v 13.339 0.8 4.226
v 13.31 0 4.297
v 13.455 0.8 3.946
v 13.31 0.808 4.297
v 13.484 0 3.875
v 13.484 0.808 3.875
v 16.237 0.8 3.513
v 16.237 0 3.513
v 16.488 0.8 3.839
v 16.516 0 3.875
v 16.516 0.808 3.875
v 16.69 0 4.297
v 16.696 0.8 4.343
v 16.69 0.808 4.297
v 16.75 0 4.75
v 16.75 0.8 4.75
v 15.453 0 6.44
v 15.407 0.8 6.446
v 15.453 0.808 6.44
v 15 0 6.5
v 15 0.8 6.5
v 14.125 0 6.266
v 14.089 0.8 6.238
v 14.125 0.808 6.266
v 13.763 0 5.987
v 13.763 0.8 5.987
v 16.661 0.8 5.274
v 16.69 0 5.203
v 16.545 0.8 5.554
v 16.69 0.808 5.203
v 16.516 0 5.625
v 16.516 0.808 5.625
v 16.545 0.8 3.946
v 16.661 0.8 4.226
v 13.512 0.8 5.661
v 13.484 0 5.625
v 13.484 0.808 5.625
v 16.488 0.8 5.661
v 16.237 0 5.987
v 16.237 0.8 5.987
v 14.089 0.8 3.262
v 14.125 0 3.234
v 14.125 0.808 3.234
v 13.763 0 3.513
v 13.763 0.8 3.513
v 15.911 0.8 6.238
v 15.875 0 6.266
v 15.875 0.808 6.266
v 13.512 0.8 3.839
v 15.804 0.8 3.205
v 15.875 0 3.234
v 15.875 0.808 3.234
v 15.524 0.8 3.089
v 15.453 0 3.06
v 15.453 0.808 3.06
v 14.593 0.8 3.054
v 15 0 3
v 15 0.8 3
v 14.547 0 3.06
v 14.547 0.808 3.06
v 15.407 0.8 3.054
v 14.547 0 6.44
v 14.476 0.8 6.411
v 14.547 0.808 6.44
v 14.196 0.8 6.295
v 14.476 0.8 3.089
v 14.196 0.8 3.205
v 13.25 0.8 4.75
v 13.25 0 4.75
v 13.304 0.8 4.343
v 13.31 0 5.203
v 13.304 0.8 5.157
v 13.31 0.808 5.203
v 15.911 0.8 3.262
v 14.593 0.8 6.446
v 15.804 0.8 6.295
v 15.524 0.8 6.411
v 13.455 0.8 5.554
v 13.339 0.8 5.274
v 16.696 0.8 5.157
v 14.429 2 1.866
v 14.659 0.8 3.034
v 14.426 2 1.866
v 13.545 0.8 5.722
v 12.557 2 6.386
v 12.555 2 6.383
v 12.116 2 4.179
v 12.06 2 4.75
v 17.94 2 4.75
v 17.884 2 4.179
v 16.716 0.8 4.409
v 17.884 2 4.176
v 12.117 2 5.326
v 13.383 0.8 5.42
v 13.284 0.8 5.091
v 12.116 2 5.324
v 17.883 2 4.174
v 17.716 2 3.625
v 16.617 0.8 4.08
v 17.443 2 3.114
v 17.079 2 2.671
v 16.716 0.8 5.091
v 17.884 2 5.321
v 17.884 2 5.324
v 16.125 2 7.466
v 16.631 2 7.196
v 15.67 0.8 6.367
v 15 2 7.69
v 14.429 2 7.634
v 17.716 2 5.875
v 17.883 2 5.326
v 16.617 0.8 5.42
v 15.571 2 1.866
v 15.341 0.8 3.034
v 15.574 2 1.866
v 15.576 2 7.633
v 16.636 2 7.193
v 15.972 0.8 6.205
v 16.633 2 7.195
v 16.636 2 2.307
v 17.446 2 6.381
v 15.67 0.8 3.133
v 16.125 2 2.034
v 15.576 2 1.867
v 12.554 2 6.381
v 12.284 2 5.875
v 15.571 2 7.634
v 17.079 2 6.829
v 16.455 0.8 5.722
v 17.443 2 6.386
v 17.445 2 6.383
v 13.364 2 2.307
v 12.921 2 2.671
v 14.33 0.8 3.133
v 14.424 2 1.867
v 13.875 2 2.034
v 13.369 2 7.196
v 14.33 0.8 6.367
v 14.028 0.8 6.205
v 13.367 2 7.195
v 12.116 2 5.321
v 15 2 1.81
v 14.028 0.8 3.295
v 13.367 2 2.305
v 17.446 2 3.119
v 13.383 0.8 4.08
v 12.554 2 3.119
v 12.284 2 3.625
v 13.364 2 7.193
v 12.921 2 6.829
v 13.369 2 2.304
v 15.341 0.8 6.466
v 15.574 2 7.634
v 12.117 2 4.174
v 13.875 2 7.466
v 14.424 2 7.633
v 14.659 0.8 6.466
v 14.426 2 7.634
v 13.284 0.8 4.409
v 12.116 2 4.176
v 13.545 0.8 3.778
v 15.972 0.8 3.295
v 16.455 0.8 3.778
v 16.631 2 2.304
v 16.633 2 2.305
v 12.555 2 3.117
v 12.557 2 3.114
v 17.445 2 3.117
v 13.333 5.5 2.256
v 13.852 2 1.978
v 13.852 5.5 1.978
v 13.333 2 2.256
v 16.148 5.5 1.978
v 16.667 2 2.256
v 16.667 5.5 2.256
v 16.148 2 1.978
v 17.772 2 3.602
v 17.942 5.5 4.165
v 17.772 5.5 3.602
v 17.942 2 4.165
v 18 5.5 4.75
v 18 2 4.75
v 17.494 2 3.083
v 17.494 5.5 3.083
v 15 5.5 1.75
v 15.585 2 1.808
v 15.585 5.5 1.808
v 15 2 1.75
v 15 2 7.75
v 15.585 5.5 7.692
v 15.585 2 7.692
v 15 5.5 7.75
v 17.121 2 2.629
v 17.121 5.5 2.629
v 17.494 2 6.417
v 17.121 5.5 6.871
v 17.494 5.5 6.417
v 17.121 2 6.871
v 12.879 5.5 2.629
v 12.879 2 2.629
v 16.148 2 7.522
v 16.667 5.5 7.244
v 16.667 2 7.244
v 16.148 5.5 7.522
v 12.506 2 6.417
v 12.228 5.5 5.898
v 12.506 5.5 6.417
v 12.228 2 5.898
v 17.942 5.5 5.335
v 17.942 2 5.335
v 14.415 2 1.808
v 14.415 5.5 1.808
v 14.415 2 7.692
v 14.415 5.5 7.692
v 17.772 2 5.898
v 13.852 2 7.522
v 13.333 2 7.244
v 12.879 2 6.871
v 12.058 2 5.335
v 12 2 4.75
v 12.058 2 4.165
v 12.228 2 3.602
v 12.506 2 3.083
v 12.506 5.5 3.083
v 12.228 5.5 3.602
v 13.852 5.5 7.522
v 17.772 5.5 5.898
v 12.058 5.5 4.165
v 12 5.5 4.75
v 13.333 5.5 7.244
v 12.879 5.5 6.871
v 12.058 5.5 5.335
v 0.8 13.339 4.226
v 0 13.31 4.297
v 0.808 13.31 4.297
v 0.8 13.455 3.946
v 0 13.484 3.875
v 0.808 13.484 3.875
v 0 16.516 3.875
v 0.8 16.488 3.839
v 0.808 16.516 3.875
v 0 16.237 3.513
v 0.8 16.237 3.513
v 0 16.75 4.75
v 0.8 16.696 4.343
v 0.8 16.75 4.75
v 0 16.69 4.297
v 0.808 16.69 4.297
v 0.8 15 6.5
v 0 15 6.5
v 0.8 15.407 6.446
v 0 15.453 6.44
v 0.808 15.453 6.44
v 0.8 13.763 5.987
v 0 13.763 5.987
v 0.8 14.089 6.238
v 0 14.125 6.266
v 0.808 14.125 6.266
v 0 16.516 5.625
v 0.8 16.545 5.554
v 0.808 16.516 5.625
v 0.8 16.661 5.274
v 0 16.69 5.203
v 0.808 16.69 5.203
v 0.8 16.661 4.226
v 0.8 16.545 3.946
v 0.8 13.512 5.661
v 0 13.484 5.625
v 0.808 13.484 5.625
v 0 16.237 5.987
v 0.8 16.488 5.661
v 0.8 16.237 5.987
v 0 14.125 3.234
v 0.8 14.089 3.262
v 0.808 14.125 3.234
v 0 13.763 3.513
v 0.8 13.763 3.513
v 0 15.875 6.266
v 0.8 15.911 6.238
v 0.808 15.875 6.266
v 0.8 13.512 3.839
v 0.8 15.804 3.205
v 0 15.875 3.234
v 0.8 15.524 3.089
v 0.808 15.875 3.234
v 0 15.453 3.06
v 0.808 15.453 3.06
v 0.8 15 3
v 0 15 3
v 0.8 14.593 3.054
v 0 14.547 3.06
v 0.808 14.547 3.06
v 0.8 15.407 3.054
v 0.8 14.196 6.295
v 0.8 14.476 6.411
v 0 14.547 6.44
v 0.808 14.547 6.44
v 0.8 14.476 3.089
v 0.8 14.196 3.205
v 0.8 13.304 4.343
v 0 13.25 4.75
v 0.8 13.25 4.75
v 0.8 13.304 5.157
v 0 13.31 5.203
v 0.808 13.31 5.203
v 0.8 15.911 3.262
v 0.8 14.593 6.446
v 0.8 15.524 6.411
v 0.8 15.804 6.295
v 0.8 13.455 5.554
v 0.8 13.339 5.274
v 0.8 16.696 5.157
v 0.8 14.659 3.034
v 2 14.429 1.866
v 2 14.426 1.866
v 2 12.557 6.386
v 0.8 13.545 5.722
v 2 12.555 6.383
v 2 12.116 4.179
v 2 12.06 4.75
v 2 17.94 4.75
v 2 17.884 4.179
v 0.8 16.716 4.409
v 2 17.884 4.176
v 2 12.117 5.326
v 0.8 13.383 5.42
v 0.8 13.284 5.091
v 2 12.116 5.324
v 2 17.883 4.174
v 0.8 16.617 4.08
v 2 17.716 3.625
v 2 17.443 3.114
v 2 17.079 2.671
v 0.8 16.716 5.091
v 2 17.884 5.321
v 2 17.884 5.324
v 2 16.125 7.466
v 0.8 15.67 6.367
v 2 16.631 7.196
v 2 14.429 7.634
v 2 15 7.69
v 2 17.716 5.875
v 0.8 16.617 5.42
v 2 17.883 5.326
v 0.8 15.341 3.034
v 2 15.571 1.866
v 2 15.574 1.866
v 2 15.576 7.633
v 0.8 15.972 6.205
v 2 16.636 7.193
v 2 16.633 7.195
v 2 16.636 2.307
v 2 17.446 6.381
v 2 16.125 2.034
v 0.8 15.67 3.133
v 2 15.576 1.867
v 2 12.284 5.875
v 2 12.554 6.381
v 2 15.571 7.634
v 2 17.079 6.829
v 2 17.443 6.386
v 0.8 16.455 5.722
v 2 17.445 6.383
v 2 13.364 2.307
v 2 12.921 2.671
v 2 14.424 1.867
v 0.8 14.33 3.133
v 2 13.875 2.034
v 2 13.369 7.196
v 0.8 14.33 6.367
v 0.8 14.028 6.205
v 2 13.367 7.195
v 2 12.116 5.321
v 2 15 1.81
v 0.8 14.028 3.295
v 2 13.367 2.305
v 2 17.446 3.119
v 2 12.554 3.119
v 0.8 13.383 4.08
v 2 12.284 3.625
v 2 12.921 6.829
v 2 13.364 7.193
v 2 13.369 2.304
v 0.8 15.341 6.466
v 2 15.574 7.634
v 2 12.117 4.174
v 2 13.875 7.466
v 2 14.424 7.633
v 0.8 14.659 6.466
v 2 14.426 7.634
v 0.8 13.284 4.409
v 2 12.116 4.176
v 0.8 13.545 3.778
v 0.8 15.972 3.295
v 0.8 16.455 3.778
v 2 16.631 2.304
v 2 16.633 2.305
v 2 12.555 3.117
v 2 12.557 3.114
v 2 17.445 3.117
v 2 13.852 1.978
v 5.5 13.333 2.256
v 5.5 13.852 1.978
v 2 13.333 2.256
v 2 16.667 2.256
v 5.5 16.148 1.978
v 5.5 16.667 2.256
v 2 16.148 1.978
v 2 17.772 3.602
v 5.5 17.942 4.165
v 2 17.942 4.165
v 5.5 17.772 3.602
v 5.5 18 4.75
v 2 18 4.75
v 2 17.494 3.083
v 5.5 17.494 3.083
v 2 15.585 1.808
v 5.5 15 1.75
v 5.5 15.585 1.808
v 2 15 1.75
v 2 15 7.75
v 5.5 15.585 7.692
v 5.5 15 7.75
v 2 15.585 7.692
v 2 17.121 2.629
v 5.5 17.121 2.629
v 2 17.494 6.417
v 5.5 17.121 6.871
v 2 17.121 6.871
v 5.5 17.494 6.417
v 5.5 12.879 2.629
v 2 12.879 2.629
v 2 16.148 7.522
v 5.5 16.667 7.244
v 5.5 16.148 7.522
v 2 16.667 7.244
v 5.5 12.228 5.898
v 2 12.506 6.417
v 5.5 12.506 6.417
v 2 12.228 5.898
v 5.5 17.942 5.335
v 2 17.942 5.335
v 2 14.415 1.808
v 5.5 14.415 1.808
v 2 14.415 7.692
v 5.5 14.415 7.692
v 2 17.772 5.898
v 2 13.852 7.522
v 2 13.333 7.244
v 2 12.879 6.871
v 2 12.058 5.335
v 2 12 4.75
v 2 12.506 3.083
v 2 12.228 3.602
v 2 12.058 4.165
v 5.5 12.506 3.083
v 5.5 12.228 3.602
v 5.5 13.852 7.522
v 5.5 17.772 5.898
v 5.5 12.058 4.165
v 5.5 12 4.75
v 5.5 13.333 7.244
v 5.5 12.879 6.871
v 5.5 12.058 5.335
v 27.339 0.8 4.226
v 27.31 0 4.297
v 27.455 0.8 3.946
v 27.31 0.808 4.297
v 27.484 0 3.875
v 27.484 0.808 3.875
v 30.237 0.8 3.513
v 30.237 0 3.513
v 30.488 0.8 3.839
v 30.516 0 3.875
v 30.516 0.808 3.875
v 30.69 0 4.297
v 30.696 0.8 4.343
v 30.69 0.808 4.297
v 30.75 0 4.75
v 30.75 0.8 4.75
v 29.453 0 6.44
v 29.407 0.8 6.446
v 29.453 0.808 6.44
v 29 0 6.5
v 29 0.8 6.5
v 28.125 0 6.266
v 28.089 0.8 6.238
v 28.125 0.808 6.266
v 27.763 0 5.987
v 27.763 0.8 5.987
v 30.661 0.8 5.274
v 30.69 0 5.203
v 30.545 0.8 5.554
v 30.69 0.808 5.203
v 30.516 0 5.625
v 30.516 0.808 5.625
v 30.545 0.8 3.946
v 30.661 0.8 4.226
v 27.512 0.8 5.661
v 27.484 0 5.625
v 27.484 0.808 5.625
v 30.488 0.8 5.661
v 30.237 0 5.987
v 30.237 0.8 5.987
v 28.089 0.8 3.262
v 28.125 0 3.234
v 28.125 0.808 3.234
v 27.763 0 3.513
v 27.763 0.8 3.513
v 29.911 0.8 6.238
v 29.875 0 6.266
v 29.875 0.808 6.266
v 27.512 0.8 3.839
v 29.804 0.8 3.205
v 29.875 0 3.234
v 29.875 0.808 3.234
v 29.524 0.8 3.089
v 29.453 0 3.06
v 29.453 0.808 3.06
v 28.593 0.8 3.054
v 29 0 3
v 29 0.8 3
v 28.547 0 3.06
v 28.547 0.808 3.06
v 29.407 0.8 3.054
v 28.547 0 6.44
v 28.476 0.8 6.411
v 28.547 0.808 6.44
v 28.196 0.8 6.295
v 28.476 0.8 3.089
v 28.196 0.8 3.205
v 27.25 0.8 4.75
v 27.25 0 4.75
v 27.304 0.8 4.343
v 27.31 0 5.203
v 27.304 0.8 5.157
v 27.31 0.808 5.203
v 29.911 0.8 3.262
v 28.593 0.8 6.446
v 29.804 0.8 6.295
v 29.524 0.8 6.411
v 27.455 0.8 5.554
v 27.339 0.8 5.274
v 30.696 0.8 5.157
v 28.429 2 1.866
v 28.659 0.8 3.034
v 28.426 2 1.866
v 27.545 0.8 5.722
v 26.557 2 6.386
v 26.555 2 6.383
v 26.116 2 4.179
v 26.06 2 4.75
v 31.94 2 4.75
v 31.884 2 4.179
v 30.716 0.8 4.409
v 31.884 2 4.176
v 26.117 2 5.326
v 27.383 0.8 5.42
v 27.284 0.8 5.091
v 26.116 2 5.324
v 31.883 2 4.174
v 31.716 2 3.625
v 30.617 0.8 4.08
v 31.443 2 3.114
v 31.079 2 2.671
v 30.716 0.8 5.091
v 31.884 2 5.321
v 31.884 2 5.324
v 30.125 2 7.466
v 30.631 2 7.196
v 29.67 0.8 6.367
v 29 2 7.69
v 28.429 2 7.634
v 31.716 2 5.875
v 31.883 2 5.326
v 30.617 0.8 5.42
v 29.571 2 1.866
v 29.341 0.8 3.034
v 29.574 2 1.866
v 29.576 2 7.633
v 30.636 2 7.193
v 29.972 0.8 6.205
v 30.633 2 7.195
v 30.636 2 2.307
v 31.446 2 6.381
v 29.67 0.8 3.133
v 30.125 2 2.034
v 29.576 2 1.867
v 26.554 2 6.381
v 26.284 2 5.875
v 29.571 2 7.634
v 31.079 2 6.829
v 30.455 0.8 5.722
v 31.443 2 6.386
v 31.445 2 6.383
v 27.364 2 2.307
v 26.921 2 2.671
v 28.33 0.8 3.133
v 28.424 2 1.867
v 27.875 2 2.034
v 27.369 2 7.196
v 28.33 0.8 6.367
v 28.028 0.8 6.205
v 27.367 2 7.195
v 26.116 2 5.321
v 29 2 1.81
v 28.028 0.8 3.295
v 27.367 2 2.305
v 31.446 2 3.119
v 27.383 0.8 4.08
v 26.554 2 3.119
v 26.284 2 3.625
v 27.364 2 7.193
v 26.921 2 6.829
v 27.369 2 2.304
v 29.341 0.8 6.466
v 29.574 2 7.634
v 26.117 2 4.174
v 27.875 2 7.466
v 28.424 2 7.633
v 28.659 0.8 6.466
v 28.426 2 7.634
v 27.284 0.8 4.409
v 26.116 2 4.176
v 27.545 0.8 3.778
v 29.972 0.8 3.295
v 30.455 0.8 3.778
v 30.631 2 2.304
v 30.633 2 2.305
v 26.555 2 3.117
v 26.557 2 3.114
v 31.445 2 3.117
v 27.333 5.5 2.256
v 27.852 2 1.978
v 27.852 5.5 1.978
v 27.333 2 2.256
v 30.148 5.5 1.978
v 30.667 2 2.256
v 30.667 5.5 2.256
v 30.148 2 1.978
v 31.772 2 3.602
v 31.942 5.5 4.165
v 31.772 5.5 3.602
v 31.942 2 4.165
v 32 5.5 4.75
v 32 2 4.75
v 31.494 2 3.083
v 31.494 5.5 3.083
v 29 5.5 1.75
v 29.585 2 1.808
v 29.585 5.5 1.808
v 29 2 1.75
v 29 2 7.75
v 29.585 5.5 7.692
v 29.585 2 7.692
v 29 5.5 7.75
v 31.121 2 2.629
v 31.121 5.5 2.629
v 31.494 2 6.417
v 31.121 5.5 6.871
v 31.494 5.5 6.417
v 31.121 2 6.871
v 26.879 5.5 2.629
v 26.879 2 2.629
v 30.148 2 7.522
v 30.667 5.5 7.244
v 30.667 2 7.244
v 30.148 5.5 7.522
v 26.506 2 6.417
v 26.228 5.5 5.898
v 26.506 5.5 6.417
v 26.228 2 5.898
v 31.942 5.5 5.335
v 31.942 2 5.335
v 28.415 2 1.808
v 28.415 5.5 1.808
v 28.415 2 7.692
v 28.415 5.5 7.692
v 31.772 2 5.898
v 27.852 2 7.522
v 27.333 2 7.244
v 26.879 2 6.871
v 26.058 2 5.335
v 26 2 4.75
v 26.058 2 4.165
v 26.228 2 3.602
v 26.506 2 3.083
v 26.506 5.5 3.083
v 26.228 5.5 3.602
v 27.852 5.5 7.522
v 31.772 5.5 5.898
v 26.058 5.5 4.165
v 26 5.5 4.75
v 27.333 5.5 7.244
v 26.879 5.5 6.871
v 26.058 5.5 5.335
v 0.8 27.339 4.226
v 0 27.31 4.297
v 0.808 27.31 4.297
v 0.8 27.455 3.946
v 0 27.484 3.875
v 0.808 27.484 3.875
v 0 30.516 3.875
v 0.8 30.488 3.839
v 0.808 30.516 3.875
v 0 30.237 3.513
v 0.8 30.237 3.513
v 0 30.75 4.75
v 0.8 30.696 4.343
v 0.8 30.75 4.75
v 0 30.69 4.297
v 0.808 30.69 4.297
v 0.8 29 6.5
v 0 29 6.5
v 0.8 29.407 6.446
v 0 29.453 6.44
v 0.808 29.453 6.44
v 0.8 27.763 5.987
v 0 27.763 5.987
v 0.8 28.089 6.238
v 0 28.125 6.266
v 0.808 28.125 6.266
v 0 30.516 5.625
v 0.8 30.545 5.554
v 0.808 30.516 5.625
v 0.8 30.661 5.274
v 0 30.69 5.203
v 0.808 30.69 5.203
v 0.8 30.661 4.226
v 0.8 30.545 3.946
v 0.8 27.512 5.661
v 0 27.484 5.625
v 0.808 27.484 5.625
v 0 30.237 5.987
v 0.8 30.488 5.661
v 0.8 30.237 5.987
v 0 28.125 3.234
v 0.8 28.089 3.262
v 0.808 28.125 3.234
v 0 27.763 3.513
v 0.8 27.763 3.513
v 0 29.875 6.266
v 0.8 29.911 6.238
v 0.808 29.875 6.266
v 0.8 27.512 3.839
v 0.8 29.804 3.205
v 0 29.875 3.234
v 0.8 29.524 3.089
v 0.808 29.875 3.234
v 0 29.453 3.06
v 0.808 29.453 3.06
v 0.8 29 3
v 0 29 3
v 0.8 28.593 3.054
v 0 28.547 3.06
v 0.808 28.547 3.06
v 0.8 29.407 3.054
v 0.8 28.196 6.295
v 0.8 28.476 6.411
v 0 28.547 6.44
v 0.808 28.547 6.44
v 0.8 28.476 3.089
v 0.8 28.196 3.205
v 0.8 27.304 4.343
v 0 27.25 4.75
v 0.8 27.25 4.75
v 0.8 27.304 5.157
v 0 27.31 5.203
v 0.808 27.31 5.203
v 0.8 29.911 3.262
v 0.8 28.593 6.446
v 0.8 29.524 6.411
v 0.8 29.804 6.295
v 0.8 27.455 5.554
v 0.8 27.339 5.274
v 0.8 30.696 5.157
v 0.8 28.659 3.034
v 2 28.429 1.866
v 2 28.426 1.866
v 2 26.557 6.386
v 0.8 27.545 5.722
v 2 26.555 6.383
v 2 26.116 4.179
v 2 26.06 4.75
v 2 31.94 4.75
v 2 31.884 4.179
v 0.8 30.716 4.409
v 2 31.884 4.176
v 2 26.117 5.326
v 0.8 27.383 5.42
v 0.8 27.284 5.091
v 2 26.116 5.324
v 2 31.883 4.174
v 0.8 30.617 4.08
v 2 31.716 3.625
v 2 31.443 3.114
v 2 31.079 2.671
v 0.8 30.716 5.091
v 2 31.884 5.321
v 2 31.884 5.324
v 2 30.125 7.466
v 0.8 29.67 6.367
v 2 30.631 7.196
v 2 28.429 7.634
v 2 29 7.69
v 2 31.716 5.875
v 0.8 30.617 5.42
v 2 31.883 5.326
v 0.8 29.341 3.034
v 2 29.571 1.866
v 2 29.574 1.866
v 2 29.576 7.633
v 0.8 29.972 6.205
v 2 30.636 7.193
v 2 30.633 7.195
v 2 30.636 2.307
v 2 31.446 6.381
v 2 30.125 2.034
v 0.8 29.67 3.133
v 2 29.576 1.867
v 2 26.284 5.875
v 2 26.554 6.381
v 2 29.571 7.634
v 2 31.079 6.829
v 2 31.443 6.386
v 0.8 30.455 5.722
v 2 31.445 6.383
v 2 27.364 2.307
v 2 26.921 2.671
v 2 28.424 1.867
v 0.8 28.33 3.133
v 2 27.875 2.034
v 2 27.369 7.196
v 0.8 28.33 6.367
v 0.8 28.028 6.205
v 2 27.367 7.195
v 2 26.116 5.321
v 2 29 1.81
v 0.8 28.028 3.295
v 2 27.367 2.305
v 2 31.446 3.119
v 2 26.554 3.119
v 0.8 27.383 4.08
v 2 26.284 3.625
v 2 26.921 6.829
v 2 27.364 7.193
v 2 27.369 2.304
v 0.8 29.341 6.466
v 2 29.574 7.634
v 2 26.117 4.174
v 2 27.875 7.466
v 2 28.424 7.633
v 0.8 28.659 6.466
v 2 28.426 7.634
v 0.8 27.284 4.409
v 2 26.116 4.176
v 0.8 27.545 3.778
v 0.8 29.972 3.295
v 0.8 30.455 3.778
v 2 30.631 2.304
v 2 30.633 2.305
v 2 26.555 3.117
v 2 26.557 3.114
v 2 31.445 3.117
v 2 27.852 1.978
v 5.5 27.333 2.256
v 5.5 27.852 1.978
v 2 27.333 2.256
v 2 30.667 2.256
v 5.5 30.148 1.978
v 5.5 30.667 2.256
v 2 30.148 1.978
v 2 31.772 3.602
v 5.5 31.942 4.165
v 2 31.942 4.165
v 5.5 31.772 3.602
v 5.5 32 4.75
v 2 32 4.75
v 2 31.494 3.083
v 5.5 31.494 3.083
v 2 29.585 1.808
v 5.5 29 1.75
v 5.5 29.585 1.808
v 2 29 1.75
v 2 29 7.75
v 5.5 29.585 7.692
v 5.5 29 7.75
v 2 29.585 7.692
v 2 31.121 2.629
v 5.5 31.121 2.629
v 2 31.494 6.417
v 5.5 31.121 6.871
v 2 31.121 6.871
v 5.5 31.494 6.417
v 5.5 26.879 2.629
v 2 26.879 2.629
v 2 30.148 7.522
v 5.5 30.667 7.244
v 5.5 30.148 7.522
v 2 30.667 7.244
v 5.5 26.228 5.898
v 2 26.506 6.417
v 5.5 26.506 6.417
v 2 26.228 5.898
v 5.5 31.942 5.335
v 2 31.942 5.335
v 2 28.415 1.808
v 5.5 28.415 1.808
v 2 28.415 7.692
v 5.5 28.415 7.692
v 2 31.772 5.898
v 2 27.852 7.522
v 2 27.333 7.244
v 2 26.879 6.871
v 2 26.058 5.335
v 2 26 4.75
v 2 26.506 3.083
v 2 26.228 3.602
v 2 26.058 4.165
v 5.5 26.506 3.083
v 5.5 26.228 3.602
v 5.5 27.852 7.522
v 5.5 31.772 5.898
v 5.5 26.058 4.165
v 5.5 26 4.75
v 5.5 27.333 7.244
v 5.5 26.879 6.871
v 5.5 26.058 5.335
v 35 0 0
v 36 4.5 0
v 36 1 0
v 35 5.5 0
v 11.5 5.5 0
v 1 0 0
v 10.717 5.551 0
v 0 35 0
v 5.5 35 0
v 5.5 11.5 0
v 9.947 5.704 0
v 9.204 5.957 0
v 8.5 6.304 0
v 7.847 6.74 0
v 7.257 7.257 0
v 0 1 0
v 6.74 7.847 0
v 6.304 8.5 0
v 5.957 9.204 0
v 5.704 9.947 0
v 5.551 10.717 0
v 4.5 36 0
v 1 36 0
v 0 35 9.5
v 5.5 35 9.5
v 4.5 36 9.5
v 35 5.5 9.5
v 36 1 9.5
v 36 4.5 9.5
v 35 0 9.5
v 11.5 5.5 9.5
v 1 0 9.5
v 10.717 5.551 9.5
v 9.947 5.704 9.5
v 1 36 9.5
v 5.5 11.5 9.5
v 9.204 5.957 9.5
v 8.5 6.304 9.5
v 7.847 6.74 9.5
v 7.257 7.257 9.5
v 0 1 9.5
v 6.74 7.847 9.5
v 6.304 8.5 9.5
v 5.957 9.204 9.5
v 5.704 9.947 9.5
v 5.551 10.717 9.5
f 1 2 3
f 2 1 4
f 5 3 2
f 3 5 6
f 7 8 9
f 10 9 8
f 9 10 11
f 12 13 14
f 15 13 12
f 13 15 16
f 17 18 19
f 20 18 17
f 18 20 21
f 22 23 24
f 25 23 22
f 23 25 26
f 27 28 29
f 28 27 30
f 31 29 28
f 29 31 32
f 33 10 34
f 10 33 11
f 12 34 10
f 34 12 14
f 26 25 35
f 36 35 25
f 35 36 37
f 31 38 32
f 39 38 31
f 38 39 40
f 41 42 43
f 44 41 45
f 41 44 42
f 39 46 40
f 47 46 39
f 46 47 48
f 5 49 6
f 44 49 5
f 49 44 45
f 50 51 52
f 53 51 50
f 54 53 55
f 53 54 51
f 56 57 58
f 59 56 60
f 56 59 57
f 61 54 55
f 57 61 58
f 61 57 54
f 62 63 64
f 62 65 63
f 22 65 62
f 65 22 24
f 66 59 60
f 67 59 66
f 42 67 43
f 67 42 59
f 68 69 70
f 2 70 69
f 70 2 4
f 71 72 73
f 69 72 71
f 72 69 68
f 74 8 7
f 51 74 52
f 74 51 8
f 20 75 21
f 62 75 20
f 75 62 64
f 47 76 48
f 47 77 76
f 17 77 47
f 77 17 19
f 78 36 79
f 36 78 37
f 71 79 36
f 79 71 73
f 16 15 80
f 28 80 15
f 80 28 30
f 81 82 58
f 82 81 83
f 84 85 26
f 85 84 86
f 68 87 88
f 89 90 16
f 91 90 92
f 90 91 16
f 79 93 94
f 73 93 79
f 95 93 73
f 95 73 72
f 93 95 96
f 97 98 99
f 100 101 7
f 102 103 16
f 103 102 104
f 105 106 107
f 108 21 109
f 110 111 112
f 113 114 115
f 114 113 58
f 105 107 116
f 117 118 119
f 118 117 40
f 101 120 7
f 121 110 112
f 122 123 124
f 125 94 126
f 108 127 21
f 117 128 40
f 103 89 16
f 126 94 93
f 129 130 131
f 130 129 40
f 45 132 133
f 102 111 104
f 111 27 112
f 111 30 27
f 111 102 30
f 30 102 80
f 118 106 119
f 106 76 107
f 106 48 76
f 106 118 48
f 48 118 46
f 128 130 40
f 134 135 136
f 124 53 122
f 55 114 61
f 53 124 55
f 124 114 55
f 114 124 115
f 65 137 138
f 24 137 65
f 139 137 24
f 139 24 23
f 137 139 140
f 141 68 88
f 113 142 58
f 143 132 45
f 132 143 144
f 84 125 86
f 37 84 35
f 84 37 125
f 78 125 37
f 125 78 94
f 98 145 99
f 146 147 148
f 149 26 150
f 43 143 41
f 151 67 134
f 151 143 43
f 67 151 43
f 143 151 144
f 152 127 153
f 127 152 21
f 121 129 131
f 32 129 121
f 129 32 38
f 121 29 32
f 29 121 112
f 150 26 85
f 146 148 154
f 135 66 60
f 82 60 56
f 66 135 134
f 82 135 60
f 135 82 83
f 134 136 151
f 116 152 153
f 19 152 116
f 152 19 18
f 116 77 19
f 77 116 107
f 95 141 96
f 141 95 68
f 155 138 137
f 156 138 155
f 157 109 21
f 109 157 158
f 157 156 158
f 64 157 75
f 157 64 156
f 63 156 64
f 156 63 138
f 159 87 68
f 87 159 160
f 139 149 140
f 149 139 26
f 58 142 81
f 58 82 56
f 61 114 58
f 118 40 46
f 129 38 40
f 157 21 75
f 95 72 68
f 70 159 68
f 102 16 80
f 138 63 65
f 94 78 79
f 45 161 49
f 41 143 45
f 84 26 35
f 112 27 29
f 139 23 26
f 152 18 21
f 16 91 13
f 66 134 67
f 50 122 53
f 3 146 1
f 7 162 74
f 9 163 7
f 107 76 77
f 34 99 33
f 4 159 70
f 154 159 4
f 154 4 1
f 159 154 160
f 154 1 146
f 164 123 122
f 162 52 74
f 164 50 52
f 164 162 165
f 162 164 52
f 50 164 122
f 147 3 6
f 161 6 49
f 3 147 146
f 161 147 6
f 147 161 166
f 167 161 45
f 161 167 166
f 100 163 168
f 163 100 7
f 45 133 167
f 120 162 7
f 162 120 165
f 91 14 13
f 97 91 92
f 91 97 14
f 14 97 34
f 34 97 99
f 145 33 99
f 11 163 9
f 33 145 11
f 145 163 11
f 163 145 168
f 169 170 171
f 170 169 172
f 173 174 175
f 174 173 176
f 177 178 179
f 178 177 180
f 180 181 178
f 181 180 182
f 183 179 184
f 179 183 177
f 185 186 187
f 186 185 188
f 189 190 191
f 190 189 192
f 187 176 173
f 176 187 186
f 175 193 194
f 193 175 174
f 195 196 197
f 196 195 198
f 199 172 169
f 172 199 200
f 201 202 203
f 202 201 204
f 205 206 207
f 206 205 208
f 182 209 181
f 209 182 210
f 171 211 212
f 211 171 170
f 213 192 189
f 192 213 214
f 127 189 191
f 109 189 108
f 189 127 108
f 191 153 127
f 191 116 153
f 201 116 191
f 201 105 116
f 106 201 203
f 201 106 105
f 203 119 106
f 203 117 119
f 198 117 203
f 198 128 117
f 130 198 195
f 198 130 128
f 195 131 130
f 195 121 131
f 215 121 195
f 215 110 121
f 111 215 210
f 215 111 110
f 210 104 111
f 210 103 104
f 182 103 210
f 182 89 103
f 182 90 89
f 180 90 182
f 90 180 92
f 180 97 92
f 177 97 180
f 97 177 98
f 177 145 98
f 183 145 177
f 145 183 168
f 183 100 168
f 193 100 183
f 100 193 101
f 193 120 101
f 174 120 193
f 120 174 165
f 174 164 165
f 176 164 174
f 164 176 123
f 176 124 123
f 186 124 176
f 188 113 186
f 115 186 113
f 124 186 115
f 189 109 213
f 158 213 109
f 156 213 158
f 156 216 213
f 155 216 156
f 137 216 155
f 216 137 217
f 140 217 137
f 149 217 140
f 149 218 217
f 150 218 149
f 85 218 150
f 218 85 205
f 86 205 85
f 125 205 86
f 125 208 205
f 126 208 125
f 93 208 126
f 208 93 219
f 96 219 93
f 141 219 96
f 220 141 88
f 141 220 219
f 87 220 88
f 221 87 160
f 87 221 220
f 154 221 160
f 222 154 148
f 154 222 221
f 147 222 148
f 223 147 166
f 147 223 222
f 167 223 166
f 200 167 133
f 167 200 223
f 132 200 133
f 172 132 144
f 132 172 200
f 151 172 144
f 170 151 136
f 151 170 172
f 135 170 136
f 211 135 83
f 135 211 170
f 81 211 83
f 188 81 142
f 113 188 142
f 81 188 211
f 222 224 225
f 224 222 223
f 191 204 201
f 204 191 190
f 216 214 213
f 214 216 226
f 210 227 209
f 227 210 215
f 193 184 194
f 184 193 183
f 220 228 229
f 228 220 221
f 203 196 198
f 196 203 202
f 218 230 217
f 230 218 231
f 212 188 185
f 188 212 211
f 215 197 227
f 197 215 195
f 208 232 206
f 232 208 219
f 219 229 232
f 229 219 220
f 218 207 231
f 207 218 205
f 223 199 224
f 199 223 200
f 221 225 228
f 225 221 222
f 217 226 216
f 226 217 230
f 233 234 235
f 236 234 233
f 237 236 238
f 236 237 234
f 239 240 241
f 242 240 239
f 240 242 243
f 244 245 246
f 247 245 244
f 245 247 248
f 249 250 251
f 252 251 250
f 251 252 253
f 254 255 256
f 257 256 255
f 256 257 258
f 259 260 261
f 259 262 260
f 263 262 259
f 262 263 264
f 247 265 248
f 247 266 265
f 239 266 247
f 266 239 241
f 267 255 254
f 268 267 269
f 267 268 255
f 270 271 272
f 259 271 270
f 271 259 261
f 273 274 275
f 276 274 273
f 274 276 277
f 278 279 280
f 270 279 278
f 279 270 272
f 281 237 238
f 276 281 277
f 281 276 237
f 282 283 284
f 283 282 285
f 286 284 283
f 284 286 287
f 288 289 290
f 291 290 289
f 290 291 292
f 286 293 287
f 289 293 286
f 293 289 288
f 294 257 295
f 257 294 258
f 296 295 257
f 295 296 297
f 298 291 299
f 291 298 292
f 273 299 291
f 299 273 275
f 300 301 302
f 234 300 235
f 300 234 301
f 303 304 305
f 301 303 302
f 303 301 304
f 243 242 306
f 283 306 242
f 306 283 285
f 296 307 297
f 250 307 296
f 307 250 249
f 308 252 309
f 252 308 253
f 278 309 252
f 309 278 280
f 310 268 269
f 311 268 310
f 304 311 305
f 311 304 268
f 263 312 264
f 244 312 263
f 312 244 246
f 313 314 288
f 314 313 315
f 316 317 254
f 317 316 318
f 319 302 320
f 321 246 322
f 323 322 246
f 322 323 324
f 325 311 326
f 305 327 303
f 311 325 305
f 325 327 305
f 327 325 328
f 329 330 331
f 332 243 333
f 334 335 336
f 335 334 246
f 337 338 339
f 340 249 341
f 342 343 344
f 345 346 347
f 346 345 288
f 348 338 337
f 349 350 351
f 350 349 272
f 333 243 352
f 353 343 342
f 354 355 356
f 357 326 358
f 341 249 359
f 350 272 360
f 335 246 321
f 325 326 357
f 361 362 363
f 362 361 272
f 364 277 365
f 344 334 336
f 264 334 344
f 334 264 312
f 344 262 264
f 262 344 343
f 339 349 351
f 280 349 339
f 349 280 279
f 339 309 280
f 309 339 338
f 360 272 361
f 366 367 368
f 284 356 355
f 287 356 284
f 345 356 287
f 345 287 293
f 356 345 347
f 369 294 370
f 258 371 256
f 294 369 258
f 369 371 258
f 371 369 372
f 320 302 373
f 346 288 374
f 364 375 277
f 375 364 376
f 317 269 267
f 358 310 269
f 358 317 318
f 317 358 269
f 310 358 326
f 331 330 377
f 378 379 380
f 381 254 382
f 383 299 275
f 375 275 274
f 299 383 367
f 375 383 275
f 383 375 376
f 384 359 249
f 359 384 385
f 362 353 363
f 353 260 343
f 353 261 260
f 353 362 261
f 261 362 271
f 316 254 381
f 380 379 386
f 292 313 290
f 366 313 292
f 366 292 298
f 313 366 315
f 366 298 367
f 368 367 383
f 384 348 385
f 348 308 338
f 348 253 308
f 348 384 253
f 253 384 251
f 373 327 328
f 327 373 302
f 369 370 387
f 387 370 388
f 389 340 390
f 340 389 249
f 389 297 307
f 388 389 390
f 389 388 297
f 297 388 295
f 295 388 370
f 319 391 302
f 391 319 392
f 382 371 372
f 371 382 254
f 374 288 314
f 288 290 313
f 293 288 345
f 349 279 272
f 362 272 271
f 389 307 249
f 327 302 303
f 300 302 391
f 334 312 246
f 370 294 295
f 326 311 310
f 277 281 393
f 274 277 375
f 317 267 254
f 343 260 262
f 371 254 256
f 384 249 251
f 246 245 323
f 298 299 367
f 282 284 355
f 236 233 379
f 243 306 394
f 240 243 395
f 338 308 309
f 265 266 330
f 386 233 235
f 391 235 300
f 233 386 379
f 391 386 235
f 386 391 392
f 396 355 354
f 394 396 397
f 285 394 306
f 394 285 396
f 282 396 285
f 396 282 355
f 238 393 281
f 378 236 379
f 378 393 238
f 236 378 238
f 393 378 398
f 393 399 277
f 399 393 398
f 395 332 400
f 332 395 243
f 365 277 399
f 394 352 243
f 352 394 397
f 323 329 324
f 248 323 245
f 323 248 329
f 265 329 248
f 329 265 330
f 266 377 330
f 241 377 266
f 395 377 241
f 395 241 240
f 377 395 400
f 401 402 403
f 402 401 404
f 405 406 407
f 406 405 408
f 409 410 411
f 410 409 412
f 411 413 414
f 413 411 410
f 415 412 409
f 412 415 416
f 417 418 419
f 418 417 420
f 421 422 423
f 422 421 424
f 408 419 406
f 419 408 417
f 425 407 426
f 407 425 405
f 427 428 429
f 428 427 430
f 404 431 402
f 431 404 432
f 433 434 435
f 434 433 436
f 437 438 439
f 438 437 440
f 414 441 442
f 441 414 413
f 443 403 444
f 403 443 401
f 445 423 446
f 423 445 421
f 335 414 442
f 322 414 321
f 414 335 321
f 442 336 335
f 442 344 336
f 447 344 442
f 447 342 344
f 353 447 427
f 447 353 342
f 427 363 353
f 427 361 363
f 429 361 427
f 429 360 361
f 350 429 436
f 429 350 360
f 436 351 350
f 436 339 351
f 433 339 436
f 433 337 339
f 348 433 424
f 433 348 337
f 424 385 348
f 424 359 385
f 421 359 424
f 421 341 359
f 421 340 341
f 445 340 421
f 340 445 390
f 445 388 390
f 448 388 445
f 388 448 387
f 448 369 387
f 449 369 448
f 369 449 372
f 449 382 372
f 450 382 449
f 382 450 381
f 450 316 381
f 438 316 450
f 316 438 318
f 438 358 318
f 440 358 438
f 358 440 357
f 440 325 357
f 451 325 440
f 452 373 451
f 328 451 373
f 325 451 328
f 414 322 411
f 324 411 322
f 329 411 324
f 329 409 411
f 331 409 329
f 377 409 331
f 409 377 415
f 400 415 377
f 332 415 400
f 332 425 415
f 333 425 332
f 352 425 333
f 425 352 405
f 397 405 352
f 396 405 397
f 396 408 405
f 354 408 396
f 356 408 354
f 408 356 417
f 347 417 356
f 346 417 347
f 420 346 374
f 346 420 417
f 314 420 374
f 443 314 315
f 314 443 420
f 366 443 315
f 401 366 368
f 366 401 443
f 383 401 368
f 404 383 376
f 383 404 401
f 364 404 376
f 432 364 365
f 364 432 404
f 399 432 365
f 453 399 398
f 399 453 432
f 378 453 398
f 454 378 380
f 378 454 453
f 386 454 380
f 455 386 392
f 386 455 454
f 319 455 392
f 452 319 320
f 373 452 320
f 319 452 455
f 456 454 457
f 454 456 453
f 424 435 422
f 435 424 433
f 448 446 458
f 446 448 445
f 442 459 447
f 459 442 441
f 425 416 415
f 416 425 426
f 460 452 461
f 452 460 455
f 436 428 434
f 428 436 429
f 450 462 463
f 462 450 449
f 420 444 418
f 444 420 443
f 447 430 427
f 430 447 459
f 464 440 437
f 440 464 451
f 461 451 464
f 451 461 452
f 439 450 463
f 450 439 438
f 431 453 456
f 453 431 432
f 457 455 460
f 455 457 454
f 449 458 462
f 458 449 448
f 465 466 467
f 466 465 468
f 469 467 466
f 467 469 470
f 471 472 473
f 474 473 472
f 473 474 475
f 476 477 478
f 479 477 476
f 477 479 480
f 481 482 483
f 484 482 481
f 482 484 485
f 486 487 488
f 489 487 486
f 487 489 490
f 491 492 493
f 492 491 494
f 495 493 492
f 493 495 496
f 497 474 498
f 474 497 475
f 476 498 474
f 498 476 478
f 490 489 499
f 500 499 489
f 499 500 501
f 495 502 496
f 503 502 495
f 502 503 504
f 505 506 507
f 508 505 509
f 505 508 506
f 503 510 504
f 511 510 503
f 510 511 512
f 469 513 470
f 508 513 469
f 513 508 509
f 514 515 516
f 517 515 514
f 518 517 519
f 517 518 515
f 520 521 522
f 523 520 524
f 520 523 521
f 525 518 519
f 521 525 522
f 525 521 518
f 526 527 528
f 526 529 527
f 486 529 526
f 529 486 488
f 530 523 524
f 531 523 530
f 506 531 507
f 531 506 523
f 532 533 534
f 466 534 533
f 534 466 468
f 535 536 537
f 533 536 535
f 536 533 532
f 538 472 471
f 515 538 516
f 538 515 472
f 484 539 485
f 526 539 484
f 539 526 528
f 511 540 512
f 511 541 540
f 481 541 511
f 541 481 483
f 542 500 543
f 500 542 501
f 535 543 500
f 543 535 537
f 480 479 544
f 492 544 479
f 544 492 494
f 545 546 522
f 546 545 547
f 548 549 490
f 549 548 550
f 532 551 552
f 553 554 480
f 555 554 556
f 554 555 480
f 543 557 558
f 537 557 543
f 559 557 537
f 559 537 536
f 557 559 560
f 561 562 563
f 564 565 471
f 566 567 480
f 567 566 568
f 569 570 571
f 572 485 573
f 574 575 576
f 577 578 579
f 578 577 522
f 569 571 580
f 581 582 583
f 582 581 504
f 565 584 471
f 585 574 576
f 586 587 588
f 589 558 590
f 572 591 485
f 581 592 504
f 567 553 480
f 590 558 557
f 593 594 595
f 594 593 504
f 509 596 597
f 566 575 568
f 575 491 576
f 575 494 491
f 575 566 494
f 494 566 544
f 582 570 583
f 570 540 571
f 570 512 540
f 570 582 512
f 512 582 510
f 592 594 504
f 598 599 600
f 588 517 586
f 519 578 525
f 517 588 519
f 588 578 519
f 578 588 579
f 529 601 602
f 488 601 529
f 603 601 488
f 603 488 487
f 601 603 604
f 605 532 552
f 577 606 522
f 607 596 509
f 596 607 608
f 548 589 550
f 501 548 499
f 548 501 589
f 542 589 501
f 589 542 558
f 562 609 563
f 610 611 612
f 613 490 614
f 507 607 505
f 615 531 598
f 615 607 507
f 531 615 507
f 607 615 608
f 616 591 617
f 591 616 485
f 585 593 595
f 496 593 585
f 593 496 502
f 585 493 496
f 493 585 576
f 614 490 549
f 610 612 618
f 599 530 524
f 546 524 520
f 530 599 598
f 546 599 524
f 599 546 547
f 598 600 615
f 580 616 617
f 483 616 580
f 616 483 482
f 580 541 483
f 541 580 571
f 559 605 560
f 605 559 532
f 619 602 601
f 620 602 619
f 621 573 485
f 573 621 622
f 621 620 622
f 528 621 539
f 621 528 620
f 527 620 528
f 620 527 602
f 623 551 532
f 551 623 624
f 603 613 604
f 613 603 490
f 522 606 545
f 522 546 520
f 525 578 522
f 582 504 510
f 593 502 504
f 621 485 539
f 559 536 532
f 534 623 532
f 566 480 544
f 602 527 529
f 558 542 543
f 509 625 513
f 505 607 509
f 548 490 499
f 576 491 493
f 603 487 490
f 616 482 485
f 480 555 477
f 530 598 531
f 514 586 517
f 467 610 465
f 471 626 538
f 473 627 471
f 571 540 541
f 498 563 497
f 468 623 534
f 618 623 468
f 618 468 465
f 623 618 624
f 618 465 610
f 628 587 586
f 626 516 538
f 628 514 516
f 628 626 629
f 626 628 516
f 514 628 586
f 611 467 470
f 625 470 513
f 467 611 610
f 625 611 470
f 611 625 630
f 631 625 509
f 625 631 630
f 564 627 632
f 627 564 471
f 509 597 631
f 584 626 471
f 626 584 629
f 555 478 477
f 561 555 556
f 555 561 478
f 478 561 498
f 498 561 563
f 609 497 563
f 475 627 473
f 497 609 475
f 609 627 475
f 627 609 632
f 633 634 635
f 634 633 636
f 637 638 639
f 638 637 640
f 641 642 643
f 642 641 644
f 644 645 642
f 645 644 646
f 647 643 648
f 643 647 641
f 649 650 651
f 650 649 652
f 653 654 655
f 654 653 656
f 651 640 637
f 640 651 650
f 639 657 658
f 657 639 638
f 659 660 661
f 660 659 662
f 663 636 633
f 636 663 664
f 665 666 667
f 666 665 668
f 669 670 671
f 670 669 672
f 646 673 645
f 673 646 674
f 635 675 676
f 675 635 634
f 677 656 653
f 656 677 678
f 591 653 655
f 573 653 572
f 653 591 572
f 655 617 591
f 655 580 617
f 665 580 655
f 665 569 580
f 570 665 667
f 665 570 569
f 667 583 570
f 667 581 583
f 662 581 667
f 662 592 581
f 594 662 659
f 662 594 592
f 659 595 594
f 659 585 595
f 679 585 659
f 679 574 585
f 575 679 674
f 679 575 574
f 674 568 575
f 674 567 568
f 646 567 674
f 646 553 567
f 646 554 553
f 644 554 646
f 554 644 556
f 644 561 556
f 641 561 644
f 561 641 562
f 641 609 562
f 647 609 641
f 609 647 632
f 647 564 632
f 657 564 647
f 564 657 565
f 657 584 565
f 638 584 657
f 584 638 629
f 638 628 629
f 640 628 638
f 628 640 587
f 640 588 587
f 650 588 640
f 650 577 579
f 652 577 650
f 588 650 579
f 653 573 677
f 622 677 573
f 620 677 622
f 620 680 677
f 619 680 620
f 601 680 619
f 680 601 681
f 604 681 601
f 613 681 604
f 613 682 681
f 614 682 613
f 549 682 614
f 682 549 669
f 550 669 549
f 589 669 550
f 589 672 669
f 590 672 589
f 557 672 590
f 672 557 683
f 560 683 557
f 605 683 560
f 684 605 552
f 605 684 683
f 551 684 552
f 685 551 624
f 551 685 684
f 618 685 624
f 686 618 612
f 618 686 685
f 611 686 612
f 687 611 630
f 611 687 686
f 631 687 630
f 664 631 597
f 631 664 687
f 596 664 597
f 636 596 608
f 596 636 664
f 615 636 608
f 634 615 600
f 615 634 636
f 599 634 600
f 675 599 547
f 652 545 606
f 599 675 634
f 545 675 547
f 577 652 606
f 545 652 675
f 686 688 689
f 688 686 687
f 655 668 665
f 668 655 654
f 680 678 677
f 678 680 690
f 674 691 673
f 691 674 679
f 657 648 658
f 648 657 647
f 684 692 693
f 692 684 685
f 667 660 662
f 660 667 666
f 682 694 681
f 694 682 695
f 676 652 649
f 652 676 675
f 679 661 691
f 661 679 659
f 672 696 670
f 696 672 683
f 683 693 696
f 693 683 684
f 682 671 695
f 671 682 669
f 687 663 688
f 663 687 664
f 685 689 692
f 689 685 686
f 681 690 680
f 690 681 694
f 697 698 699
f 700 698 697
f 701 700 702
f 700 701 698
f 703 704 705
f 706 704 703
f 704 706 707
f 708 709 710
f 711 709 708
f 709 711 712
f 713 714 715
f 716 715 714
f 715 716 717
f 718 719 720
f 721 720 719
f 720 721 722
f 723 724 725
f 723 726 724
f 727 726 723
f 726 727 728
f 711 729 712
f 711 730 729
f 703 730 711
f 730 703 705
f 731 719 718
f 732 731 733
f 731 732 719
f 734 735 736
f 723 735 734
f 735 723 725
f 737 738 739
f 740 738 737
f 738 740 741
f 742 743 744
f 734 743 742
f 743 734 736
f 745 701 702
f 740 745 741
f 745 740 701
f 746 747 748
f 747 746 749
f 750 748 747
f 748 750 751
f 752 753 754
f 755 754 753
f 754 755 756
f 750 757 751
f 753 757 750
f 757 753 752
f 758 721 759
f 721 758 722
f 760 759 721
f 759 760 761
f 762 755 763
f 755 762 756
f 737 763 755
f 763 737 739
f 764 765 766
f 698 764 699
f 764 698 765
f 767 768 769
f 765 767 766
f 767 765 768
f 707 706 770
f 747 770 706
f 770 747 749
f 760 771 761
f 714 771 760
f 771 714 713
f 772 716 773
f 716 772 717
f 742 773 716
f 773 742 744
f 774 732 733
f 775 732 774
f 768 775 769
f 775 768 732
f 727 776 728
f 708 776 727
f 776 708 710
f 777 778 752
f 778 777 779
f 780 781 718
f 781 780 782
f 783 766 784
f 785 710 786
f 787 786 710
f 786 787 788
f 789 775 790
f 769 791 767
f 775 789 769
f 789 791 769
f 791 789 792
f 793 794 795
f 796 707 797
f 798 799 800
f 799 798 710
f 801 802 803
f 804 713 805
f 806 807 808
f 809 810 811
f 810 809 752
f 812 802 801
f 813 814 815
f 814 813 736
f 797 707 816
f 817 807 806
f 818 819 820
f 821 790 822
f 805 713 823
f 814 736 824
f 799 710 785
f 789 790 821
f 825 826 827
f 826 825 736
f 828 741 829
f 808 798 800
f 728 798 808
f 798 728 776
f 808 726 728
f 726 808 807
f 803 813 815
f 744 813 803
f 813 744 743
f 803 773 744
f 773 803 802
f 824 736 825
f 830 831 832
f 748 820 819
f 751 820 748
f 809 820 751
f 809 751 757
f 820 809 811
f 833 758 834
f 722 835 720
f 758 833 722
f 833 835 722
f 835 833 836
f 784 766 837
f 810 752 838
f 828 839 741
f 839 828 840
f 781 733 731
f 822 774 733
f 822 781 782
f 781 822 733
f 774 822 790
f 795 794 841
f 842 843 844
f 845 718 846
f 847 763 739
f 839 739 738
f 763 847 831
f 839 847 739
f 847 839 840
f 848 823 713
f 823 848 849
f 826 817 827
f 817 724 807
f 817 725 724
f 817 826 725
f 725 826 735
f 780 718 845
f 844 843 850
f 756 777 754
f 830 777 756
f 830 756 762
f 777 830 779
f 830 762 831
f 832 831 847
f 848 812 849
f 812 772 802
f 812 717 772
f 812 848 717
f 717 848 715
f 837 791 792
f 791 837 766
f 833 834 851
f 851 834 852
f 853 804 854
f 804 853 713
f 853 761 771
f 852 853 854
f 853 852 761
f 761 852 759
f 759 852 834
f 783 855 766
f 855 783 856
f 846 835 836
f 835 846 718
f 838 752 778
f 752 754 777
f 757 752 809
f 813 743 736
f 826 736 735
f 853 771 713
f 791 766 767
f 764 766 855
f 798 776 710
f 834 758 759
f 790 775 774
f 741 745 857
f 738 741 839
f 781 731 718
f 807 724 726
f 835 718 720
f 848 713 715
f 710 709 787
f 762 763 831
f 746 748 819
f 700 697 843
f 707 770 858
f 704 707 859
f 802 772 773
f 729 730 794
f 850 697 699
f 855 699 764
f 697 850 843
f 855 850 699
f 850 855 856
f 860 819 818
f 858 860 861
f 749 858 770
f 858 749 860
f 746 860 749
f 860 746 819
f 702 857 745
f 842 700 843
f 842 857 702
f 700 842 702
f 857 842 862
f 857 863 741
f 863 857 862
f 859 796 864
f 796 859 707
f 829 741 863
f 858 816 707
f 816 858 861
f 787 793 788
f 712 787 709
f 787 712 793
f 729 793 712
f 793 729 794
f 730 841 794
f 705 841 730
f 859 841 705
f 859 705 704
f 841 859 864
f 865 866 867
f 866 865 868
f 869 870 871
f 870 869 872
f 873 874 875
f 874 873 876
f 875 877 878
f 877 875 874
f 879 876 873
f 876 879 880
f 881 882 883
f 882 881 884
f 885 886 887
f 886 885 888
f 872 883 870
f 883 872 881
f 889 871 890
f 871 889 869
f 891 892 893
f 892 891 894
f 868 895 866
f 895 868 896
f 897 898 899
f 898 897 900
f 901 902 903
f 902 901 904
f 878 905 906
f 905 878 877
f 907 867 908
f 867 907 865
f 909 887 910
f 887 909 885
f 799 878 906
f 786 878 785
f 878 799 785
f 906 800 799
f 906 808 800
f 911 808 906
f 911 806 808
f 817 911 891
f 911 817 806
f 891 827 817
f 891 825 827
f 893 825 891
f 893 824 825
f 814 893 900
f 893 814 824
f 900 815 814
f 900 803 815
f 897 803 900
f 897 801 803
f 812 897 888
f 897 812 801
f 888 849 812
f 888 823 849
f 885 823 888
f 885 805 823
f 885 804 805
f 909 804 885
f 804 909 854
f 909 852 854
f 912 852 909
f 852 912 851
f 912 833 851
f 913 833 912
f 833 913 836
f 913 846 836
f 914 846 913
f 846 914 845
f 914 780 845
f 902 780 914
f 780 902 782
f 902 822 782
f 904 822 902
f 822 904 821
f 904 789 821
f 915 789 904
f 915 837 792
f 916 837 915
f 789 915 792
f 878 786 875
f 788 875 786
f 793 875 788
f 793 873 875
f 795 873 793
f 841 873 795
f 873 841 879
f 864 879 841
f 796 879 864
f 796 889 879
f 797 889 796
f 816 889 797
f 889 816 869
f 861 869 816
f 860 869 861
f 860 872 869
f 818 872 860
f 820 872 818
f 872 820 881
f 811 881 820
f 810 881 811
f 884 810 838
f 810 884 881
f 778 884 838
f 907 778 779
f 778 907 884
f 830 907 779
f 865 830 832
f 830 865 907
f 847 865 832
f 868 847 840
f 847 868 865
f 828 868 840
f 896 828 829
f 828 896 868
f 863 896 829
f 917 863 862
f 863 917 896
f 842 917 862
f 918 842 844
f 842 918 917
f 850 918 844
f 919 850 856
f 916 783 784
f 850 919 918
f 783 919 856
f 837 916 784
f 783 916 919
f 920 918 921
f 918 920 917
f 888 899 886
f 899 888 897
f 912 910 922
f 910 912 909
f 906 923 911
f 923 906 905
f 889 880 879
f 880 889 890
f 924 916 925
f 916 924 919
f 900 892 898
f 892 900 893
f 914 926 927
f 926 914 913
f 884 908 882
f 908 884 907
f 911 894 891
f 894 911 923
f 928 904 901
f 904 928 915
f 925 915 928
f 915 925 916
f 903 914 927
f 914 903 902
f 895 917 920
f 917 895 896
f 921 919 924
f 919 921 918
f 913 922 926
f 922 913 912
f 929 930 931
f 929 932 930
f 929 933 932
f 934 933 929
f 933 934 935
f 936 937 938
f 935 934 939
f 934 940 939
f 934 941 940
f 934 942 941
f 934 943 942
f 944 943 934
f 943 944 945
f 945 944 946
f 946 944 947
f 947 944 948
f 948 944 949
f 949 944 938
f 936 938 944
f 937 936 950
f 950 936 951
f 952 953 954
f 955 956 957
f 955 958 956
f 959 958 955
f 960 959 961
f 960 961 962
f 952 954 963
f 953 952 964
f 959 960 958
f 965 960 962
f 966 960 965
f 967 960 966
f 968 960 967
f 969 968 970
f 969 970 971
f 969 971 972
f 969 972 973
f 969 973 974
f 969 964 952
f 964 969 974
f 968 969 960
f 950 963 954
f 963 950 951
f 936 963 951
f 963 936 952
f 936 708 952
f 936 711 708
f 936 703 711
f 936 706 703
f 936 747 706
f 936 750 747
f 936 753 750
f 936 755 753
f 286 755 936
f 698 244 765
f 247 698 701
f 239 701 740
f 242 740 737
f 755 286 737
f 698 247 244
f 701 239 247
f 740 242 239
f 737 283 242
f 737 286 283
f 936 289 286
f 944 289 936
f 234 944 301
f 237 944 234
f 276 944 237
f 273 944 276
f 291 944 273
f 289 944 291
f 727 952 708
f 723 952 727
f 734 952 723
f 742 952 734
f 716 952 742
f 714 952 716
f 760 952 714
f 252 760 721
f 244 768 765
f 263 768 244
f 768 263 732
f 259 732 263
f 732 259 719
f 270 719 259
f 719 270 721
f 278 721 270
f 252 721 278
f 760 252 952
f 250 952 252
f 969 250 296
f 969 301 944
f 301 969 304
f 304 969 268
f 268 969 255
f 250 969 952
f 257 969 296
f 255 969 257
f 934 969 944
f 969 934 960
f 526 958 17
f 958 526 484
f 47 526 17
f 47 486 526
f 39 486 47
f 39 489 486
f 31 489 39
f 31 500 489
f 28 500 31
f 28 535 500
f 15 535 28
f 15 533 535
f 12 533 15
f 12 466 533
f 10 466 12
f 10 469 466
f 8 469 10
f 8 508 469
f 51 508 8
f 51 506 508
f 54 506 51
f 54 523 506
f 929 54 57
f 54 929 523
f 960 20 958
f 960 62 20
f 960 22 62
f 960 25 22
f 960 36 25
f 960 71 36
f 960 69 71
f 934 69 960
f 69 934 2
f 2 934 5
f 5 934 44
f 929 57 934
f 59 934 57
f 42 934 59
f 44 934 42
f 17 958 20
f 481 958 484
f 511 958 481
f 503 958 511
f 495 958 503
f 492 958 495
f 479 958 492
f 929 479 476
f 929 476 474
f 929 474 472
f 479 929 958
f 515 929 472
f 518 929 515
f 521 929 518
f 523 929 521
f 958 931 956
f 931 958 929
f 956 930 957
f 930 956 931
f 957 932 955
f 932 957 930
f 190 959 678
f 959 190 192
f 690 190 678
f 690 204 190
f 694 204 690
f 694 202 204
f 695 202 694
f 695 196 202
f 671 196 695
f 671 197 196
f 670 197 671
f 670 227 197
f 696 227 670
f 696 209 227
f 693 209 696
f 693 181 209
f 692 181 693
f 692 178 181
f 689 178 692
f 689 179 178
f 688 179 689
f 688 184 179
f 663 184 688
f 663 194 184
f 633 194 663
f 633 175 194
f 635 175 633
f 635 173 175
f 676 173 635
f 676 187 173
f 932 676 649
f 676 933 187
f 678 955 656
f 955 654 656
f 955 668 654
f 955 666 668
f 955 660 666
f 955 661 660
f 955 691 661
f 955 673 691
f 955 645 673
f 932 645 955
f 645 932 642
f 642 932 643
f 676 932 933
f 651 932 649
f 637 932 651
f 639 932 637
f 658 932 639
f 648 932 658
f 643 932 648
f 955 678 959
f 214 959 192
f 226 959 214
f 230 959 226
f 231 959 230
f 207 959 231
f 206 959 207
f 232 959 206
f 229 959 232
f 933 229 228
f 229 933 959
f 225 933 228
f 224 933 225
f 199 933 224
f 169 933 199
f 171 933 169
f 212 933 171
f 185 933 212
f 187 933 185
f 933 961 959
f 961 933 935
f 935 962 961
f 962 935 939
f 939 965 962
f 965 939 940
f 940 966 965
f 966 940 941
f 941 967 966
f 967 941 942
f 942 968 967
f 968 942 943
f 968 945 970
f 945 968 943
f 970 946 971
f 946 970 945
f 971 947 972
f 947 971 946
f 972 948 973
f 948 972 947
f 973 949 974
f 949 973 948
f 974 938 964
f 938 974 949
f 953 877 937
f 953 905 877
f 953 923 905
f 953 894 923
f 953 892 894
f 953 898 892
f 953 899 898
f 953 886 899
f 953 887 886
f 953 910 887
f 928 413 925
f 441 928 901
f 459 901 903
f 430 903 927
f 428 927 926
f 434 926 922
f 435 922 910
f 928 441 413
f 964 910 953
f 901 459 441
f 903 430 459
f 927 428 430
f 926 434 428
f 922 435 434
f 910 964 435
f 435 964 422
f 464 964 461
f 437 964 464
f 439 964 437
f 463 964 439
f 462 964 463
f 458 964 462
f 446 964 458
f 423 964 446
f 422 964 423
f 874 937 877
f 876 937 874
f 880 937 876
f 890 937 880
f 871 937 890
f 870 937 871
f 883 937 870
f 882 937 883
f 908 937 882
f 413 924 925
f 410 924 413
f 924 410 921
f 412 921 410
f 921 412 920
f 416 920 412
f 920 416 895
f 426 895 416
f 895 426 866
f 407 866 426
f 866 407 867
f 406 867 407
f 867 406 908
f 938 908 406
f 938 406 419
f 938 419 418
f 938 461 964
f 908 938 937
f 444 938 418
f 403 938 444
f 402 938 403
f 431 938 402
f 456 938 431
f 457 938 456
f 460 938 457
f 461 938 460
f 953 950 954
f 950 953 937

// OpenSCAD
// 2026-10-31: inside corner bracket for the dry box's 1010 front frame. A 90 degree angle
// in each inside corner of the door opening: one leg on the horizontal member's inner face,
// one on the vertical's inner face, 2 M3 screws per leg into T-nuts in those slots
// (the outer slots carry the panel screws, the front face carries the foam seal).
// Symmetric, so all 4 corners take the same part. The bracket is 0.5 mm narrower than the
// extrusion depth: set it flush with the back face so it stays clear of the door and seal.
// Print on its side (the L profile on the bed): layers then run around the corner, and the
// screw holes print horizontal (small, they bridge fine). PLA, 0.2 mm, 4 walls, 40 %.
// Profile axes: x along the horizontal leg, y along the vertical leg, z across the
// extrusion depth. Units mm.

ext     = 10;      // 1010 extrusion width and depth
// 2026-11-11: screws are now the M3 x 4 countersunk screws that come with the T-nuts (4 overall,
// head 6 x 90 deg): a counterbore from the exposed face down to csk_floor above the mounting
// face, a 90 deg countersink at its bottom, so the tip reaches 4 - csk_floor = 2.0 below the
// 1010 face (stop at 2.7). The leg keeps its full thickness around the holes.
// Head measured 5.7 across (2026-11-11).
csk_floor = 2.0;   // plastic under the head top: sets the reach
csk_d     = 5.9;   // countersink top diameter: the 5.7 head seats 0.1 below the counterbore floor (reach 2.1)
cb_d      = 6.0;   // counterbore: head and driver access
plate_t = 5.5;     // 2026-11-11: was 5.0. Measured: an M3 x 8 bottoms 2.7 below the 1010 face (5.3 showing),
                   // so 5.0 left the head 0.3 off the plate. 5.5: reaches 2.5 = tnut_tip in panels.scad
leg     = 36;      // leg length from the corner
w       = ext - 0.5;
screw_d = 3.5;     // M3 clearance
screw   = [15, 29];    // hole positions from the corner, both legs
fillet  = 6;       // inside fillet, kept clear of the nearest screw head (M3 head d 5.5)
edge_r  = 1;       // rounding on the leg ends and the outer corner
// alignment key: a rib down each leg's mounting face that drops into the slot opening
// (3.3 mm) and keeps the bracket centered and square. Tapered 3.0 -> 2.0 mm so it
// starts easily and its sideways overhang prints without support.
// 2026-11-11: KEY REMOVED (key_h = 0). Test fit: the rib reached past the slot lips and hit
// the T-nut, so the screw could not pull the nut up against the rail. Flat face now.
key_on  = false;
key_h   = key_on ? 1.0 : 0;
key_w   = [3.0, 2.0];  // at the face, at the tip
key_end = 1.5;         // stop short of the leg end and of the rounded outer corner

module profile() {
    offset(r = edge_r) offset(delta = -edge_r) union() {
        square([leg, plate_t]);
        square([plate_t, leg]);
    }
    translate([plate_t, plate_t]) difference() {
        square(fillet);
        translate([fillet, fillet]) circle(r = fillet, $fn = 48);
    }
}

// key along x on the y = 0 face, protruding toward -y
module key() {
    hull() {
        translate([key_end, -0.01, (w - key_w[0]) / 2]) cube([leg - 2 * key_end, 0.01, key_w[0]]);
        translate([key_end, -key_h, (w - key_w[1]) / 2]) cube([leg - 2 * key_end, 0.01, key_w[1]]);
    }
}

module csk_hole() {   // along +z from the mounting face (z = 0)
    translate([0, 0, -key_h - 1]) cylinder(d = screw_d, h = plate_t + key_h + 2, $fn = 24);
    translate([0, 0, csk_floor - (csk_d - screw_d) / 2]) cylinder(d1 = screw_d, d2 = csk_d, h = (csk_d - screw_d) / 2 + 0.01, $fn = 32);
    translate([0, 0, csk_floor]) cylinder(d = cb_d, h = plate_t, $fn = 32);
}

difference() {
    union() {
        linear_extrude(w) profile();
        if (key_on) {
            key();                                                 // horizontal leg
            multmatrix([[0, 1, 0, 0], [1, 0, 0, 0], [0, 0, 1, 0]]) key();   // vertical leg (x <-> y)
        }
    }
    for (p = screw) {
        translate([p, 0, w / 2]) rotate([-90, 0, 0]) csk_hole();                                          // horizontal leg, axis +y
        multmatrix([[0, 1, 0, 0], [1, 0, 0, 0], [0, 0, 1, 0]]) translate([p, 0, w / 2]) rotate([-90, 0, 0]) csk_hole();   // vertical leg
    }
}

echo(str("inside bracket ", leg, " x ", leg, " x ", w, " mm, plate ", plate_t,
         "; screws at ", screw, "; counterbore clear of the fillet by ",
         screw[0] - cb_d / 2 - (plate_t + fillet), " mm; side walls by the counterbore ", (w - cb_d) / 2,
         "; M3 x 4 csk (head 5.7) reach ", 4 - csk_floor + (csk_d - 5.7) / 2));
